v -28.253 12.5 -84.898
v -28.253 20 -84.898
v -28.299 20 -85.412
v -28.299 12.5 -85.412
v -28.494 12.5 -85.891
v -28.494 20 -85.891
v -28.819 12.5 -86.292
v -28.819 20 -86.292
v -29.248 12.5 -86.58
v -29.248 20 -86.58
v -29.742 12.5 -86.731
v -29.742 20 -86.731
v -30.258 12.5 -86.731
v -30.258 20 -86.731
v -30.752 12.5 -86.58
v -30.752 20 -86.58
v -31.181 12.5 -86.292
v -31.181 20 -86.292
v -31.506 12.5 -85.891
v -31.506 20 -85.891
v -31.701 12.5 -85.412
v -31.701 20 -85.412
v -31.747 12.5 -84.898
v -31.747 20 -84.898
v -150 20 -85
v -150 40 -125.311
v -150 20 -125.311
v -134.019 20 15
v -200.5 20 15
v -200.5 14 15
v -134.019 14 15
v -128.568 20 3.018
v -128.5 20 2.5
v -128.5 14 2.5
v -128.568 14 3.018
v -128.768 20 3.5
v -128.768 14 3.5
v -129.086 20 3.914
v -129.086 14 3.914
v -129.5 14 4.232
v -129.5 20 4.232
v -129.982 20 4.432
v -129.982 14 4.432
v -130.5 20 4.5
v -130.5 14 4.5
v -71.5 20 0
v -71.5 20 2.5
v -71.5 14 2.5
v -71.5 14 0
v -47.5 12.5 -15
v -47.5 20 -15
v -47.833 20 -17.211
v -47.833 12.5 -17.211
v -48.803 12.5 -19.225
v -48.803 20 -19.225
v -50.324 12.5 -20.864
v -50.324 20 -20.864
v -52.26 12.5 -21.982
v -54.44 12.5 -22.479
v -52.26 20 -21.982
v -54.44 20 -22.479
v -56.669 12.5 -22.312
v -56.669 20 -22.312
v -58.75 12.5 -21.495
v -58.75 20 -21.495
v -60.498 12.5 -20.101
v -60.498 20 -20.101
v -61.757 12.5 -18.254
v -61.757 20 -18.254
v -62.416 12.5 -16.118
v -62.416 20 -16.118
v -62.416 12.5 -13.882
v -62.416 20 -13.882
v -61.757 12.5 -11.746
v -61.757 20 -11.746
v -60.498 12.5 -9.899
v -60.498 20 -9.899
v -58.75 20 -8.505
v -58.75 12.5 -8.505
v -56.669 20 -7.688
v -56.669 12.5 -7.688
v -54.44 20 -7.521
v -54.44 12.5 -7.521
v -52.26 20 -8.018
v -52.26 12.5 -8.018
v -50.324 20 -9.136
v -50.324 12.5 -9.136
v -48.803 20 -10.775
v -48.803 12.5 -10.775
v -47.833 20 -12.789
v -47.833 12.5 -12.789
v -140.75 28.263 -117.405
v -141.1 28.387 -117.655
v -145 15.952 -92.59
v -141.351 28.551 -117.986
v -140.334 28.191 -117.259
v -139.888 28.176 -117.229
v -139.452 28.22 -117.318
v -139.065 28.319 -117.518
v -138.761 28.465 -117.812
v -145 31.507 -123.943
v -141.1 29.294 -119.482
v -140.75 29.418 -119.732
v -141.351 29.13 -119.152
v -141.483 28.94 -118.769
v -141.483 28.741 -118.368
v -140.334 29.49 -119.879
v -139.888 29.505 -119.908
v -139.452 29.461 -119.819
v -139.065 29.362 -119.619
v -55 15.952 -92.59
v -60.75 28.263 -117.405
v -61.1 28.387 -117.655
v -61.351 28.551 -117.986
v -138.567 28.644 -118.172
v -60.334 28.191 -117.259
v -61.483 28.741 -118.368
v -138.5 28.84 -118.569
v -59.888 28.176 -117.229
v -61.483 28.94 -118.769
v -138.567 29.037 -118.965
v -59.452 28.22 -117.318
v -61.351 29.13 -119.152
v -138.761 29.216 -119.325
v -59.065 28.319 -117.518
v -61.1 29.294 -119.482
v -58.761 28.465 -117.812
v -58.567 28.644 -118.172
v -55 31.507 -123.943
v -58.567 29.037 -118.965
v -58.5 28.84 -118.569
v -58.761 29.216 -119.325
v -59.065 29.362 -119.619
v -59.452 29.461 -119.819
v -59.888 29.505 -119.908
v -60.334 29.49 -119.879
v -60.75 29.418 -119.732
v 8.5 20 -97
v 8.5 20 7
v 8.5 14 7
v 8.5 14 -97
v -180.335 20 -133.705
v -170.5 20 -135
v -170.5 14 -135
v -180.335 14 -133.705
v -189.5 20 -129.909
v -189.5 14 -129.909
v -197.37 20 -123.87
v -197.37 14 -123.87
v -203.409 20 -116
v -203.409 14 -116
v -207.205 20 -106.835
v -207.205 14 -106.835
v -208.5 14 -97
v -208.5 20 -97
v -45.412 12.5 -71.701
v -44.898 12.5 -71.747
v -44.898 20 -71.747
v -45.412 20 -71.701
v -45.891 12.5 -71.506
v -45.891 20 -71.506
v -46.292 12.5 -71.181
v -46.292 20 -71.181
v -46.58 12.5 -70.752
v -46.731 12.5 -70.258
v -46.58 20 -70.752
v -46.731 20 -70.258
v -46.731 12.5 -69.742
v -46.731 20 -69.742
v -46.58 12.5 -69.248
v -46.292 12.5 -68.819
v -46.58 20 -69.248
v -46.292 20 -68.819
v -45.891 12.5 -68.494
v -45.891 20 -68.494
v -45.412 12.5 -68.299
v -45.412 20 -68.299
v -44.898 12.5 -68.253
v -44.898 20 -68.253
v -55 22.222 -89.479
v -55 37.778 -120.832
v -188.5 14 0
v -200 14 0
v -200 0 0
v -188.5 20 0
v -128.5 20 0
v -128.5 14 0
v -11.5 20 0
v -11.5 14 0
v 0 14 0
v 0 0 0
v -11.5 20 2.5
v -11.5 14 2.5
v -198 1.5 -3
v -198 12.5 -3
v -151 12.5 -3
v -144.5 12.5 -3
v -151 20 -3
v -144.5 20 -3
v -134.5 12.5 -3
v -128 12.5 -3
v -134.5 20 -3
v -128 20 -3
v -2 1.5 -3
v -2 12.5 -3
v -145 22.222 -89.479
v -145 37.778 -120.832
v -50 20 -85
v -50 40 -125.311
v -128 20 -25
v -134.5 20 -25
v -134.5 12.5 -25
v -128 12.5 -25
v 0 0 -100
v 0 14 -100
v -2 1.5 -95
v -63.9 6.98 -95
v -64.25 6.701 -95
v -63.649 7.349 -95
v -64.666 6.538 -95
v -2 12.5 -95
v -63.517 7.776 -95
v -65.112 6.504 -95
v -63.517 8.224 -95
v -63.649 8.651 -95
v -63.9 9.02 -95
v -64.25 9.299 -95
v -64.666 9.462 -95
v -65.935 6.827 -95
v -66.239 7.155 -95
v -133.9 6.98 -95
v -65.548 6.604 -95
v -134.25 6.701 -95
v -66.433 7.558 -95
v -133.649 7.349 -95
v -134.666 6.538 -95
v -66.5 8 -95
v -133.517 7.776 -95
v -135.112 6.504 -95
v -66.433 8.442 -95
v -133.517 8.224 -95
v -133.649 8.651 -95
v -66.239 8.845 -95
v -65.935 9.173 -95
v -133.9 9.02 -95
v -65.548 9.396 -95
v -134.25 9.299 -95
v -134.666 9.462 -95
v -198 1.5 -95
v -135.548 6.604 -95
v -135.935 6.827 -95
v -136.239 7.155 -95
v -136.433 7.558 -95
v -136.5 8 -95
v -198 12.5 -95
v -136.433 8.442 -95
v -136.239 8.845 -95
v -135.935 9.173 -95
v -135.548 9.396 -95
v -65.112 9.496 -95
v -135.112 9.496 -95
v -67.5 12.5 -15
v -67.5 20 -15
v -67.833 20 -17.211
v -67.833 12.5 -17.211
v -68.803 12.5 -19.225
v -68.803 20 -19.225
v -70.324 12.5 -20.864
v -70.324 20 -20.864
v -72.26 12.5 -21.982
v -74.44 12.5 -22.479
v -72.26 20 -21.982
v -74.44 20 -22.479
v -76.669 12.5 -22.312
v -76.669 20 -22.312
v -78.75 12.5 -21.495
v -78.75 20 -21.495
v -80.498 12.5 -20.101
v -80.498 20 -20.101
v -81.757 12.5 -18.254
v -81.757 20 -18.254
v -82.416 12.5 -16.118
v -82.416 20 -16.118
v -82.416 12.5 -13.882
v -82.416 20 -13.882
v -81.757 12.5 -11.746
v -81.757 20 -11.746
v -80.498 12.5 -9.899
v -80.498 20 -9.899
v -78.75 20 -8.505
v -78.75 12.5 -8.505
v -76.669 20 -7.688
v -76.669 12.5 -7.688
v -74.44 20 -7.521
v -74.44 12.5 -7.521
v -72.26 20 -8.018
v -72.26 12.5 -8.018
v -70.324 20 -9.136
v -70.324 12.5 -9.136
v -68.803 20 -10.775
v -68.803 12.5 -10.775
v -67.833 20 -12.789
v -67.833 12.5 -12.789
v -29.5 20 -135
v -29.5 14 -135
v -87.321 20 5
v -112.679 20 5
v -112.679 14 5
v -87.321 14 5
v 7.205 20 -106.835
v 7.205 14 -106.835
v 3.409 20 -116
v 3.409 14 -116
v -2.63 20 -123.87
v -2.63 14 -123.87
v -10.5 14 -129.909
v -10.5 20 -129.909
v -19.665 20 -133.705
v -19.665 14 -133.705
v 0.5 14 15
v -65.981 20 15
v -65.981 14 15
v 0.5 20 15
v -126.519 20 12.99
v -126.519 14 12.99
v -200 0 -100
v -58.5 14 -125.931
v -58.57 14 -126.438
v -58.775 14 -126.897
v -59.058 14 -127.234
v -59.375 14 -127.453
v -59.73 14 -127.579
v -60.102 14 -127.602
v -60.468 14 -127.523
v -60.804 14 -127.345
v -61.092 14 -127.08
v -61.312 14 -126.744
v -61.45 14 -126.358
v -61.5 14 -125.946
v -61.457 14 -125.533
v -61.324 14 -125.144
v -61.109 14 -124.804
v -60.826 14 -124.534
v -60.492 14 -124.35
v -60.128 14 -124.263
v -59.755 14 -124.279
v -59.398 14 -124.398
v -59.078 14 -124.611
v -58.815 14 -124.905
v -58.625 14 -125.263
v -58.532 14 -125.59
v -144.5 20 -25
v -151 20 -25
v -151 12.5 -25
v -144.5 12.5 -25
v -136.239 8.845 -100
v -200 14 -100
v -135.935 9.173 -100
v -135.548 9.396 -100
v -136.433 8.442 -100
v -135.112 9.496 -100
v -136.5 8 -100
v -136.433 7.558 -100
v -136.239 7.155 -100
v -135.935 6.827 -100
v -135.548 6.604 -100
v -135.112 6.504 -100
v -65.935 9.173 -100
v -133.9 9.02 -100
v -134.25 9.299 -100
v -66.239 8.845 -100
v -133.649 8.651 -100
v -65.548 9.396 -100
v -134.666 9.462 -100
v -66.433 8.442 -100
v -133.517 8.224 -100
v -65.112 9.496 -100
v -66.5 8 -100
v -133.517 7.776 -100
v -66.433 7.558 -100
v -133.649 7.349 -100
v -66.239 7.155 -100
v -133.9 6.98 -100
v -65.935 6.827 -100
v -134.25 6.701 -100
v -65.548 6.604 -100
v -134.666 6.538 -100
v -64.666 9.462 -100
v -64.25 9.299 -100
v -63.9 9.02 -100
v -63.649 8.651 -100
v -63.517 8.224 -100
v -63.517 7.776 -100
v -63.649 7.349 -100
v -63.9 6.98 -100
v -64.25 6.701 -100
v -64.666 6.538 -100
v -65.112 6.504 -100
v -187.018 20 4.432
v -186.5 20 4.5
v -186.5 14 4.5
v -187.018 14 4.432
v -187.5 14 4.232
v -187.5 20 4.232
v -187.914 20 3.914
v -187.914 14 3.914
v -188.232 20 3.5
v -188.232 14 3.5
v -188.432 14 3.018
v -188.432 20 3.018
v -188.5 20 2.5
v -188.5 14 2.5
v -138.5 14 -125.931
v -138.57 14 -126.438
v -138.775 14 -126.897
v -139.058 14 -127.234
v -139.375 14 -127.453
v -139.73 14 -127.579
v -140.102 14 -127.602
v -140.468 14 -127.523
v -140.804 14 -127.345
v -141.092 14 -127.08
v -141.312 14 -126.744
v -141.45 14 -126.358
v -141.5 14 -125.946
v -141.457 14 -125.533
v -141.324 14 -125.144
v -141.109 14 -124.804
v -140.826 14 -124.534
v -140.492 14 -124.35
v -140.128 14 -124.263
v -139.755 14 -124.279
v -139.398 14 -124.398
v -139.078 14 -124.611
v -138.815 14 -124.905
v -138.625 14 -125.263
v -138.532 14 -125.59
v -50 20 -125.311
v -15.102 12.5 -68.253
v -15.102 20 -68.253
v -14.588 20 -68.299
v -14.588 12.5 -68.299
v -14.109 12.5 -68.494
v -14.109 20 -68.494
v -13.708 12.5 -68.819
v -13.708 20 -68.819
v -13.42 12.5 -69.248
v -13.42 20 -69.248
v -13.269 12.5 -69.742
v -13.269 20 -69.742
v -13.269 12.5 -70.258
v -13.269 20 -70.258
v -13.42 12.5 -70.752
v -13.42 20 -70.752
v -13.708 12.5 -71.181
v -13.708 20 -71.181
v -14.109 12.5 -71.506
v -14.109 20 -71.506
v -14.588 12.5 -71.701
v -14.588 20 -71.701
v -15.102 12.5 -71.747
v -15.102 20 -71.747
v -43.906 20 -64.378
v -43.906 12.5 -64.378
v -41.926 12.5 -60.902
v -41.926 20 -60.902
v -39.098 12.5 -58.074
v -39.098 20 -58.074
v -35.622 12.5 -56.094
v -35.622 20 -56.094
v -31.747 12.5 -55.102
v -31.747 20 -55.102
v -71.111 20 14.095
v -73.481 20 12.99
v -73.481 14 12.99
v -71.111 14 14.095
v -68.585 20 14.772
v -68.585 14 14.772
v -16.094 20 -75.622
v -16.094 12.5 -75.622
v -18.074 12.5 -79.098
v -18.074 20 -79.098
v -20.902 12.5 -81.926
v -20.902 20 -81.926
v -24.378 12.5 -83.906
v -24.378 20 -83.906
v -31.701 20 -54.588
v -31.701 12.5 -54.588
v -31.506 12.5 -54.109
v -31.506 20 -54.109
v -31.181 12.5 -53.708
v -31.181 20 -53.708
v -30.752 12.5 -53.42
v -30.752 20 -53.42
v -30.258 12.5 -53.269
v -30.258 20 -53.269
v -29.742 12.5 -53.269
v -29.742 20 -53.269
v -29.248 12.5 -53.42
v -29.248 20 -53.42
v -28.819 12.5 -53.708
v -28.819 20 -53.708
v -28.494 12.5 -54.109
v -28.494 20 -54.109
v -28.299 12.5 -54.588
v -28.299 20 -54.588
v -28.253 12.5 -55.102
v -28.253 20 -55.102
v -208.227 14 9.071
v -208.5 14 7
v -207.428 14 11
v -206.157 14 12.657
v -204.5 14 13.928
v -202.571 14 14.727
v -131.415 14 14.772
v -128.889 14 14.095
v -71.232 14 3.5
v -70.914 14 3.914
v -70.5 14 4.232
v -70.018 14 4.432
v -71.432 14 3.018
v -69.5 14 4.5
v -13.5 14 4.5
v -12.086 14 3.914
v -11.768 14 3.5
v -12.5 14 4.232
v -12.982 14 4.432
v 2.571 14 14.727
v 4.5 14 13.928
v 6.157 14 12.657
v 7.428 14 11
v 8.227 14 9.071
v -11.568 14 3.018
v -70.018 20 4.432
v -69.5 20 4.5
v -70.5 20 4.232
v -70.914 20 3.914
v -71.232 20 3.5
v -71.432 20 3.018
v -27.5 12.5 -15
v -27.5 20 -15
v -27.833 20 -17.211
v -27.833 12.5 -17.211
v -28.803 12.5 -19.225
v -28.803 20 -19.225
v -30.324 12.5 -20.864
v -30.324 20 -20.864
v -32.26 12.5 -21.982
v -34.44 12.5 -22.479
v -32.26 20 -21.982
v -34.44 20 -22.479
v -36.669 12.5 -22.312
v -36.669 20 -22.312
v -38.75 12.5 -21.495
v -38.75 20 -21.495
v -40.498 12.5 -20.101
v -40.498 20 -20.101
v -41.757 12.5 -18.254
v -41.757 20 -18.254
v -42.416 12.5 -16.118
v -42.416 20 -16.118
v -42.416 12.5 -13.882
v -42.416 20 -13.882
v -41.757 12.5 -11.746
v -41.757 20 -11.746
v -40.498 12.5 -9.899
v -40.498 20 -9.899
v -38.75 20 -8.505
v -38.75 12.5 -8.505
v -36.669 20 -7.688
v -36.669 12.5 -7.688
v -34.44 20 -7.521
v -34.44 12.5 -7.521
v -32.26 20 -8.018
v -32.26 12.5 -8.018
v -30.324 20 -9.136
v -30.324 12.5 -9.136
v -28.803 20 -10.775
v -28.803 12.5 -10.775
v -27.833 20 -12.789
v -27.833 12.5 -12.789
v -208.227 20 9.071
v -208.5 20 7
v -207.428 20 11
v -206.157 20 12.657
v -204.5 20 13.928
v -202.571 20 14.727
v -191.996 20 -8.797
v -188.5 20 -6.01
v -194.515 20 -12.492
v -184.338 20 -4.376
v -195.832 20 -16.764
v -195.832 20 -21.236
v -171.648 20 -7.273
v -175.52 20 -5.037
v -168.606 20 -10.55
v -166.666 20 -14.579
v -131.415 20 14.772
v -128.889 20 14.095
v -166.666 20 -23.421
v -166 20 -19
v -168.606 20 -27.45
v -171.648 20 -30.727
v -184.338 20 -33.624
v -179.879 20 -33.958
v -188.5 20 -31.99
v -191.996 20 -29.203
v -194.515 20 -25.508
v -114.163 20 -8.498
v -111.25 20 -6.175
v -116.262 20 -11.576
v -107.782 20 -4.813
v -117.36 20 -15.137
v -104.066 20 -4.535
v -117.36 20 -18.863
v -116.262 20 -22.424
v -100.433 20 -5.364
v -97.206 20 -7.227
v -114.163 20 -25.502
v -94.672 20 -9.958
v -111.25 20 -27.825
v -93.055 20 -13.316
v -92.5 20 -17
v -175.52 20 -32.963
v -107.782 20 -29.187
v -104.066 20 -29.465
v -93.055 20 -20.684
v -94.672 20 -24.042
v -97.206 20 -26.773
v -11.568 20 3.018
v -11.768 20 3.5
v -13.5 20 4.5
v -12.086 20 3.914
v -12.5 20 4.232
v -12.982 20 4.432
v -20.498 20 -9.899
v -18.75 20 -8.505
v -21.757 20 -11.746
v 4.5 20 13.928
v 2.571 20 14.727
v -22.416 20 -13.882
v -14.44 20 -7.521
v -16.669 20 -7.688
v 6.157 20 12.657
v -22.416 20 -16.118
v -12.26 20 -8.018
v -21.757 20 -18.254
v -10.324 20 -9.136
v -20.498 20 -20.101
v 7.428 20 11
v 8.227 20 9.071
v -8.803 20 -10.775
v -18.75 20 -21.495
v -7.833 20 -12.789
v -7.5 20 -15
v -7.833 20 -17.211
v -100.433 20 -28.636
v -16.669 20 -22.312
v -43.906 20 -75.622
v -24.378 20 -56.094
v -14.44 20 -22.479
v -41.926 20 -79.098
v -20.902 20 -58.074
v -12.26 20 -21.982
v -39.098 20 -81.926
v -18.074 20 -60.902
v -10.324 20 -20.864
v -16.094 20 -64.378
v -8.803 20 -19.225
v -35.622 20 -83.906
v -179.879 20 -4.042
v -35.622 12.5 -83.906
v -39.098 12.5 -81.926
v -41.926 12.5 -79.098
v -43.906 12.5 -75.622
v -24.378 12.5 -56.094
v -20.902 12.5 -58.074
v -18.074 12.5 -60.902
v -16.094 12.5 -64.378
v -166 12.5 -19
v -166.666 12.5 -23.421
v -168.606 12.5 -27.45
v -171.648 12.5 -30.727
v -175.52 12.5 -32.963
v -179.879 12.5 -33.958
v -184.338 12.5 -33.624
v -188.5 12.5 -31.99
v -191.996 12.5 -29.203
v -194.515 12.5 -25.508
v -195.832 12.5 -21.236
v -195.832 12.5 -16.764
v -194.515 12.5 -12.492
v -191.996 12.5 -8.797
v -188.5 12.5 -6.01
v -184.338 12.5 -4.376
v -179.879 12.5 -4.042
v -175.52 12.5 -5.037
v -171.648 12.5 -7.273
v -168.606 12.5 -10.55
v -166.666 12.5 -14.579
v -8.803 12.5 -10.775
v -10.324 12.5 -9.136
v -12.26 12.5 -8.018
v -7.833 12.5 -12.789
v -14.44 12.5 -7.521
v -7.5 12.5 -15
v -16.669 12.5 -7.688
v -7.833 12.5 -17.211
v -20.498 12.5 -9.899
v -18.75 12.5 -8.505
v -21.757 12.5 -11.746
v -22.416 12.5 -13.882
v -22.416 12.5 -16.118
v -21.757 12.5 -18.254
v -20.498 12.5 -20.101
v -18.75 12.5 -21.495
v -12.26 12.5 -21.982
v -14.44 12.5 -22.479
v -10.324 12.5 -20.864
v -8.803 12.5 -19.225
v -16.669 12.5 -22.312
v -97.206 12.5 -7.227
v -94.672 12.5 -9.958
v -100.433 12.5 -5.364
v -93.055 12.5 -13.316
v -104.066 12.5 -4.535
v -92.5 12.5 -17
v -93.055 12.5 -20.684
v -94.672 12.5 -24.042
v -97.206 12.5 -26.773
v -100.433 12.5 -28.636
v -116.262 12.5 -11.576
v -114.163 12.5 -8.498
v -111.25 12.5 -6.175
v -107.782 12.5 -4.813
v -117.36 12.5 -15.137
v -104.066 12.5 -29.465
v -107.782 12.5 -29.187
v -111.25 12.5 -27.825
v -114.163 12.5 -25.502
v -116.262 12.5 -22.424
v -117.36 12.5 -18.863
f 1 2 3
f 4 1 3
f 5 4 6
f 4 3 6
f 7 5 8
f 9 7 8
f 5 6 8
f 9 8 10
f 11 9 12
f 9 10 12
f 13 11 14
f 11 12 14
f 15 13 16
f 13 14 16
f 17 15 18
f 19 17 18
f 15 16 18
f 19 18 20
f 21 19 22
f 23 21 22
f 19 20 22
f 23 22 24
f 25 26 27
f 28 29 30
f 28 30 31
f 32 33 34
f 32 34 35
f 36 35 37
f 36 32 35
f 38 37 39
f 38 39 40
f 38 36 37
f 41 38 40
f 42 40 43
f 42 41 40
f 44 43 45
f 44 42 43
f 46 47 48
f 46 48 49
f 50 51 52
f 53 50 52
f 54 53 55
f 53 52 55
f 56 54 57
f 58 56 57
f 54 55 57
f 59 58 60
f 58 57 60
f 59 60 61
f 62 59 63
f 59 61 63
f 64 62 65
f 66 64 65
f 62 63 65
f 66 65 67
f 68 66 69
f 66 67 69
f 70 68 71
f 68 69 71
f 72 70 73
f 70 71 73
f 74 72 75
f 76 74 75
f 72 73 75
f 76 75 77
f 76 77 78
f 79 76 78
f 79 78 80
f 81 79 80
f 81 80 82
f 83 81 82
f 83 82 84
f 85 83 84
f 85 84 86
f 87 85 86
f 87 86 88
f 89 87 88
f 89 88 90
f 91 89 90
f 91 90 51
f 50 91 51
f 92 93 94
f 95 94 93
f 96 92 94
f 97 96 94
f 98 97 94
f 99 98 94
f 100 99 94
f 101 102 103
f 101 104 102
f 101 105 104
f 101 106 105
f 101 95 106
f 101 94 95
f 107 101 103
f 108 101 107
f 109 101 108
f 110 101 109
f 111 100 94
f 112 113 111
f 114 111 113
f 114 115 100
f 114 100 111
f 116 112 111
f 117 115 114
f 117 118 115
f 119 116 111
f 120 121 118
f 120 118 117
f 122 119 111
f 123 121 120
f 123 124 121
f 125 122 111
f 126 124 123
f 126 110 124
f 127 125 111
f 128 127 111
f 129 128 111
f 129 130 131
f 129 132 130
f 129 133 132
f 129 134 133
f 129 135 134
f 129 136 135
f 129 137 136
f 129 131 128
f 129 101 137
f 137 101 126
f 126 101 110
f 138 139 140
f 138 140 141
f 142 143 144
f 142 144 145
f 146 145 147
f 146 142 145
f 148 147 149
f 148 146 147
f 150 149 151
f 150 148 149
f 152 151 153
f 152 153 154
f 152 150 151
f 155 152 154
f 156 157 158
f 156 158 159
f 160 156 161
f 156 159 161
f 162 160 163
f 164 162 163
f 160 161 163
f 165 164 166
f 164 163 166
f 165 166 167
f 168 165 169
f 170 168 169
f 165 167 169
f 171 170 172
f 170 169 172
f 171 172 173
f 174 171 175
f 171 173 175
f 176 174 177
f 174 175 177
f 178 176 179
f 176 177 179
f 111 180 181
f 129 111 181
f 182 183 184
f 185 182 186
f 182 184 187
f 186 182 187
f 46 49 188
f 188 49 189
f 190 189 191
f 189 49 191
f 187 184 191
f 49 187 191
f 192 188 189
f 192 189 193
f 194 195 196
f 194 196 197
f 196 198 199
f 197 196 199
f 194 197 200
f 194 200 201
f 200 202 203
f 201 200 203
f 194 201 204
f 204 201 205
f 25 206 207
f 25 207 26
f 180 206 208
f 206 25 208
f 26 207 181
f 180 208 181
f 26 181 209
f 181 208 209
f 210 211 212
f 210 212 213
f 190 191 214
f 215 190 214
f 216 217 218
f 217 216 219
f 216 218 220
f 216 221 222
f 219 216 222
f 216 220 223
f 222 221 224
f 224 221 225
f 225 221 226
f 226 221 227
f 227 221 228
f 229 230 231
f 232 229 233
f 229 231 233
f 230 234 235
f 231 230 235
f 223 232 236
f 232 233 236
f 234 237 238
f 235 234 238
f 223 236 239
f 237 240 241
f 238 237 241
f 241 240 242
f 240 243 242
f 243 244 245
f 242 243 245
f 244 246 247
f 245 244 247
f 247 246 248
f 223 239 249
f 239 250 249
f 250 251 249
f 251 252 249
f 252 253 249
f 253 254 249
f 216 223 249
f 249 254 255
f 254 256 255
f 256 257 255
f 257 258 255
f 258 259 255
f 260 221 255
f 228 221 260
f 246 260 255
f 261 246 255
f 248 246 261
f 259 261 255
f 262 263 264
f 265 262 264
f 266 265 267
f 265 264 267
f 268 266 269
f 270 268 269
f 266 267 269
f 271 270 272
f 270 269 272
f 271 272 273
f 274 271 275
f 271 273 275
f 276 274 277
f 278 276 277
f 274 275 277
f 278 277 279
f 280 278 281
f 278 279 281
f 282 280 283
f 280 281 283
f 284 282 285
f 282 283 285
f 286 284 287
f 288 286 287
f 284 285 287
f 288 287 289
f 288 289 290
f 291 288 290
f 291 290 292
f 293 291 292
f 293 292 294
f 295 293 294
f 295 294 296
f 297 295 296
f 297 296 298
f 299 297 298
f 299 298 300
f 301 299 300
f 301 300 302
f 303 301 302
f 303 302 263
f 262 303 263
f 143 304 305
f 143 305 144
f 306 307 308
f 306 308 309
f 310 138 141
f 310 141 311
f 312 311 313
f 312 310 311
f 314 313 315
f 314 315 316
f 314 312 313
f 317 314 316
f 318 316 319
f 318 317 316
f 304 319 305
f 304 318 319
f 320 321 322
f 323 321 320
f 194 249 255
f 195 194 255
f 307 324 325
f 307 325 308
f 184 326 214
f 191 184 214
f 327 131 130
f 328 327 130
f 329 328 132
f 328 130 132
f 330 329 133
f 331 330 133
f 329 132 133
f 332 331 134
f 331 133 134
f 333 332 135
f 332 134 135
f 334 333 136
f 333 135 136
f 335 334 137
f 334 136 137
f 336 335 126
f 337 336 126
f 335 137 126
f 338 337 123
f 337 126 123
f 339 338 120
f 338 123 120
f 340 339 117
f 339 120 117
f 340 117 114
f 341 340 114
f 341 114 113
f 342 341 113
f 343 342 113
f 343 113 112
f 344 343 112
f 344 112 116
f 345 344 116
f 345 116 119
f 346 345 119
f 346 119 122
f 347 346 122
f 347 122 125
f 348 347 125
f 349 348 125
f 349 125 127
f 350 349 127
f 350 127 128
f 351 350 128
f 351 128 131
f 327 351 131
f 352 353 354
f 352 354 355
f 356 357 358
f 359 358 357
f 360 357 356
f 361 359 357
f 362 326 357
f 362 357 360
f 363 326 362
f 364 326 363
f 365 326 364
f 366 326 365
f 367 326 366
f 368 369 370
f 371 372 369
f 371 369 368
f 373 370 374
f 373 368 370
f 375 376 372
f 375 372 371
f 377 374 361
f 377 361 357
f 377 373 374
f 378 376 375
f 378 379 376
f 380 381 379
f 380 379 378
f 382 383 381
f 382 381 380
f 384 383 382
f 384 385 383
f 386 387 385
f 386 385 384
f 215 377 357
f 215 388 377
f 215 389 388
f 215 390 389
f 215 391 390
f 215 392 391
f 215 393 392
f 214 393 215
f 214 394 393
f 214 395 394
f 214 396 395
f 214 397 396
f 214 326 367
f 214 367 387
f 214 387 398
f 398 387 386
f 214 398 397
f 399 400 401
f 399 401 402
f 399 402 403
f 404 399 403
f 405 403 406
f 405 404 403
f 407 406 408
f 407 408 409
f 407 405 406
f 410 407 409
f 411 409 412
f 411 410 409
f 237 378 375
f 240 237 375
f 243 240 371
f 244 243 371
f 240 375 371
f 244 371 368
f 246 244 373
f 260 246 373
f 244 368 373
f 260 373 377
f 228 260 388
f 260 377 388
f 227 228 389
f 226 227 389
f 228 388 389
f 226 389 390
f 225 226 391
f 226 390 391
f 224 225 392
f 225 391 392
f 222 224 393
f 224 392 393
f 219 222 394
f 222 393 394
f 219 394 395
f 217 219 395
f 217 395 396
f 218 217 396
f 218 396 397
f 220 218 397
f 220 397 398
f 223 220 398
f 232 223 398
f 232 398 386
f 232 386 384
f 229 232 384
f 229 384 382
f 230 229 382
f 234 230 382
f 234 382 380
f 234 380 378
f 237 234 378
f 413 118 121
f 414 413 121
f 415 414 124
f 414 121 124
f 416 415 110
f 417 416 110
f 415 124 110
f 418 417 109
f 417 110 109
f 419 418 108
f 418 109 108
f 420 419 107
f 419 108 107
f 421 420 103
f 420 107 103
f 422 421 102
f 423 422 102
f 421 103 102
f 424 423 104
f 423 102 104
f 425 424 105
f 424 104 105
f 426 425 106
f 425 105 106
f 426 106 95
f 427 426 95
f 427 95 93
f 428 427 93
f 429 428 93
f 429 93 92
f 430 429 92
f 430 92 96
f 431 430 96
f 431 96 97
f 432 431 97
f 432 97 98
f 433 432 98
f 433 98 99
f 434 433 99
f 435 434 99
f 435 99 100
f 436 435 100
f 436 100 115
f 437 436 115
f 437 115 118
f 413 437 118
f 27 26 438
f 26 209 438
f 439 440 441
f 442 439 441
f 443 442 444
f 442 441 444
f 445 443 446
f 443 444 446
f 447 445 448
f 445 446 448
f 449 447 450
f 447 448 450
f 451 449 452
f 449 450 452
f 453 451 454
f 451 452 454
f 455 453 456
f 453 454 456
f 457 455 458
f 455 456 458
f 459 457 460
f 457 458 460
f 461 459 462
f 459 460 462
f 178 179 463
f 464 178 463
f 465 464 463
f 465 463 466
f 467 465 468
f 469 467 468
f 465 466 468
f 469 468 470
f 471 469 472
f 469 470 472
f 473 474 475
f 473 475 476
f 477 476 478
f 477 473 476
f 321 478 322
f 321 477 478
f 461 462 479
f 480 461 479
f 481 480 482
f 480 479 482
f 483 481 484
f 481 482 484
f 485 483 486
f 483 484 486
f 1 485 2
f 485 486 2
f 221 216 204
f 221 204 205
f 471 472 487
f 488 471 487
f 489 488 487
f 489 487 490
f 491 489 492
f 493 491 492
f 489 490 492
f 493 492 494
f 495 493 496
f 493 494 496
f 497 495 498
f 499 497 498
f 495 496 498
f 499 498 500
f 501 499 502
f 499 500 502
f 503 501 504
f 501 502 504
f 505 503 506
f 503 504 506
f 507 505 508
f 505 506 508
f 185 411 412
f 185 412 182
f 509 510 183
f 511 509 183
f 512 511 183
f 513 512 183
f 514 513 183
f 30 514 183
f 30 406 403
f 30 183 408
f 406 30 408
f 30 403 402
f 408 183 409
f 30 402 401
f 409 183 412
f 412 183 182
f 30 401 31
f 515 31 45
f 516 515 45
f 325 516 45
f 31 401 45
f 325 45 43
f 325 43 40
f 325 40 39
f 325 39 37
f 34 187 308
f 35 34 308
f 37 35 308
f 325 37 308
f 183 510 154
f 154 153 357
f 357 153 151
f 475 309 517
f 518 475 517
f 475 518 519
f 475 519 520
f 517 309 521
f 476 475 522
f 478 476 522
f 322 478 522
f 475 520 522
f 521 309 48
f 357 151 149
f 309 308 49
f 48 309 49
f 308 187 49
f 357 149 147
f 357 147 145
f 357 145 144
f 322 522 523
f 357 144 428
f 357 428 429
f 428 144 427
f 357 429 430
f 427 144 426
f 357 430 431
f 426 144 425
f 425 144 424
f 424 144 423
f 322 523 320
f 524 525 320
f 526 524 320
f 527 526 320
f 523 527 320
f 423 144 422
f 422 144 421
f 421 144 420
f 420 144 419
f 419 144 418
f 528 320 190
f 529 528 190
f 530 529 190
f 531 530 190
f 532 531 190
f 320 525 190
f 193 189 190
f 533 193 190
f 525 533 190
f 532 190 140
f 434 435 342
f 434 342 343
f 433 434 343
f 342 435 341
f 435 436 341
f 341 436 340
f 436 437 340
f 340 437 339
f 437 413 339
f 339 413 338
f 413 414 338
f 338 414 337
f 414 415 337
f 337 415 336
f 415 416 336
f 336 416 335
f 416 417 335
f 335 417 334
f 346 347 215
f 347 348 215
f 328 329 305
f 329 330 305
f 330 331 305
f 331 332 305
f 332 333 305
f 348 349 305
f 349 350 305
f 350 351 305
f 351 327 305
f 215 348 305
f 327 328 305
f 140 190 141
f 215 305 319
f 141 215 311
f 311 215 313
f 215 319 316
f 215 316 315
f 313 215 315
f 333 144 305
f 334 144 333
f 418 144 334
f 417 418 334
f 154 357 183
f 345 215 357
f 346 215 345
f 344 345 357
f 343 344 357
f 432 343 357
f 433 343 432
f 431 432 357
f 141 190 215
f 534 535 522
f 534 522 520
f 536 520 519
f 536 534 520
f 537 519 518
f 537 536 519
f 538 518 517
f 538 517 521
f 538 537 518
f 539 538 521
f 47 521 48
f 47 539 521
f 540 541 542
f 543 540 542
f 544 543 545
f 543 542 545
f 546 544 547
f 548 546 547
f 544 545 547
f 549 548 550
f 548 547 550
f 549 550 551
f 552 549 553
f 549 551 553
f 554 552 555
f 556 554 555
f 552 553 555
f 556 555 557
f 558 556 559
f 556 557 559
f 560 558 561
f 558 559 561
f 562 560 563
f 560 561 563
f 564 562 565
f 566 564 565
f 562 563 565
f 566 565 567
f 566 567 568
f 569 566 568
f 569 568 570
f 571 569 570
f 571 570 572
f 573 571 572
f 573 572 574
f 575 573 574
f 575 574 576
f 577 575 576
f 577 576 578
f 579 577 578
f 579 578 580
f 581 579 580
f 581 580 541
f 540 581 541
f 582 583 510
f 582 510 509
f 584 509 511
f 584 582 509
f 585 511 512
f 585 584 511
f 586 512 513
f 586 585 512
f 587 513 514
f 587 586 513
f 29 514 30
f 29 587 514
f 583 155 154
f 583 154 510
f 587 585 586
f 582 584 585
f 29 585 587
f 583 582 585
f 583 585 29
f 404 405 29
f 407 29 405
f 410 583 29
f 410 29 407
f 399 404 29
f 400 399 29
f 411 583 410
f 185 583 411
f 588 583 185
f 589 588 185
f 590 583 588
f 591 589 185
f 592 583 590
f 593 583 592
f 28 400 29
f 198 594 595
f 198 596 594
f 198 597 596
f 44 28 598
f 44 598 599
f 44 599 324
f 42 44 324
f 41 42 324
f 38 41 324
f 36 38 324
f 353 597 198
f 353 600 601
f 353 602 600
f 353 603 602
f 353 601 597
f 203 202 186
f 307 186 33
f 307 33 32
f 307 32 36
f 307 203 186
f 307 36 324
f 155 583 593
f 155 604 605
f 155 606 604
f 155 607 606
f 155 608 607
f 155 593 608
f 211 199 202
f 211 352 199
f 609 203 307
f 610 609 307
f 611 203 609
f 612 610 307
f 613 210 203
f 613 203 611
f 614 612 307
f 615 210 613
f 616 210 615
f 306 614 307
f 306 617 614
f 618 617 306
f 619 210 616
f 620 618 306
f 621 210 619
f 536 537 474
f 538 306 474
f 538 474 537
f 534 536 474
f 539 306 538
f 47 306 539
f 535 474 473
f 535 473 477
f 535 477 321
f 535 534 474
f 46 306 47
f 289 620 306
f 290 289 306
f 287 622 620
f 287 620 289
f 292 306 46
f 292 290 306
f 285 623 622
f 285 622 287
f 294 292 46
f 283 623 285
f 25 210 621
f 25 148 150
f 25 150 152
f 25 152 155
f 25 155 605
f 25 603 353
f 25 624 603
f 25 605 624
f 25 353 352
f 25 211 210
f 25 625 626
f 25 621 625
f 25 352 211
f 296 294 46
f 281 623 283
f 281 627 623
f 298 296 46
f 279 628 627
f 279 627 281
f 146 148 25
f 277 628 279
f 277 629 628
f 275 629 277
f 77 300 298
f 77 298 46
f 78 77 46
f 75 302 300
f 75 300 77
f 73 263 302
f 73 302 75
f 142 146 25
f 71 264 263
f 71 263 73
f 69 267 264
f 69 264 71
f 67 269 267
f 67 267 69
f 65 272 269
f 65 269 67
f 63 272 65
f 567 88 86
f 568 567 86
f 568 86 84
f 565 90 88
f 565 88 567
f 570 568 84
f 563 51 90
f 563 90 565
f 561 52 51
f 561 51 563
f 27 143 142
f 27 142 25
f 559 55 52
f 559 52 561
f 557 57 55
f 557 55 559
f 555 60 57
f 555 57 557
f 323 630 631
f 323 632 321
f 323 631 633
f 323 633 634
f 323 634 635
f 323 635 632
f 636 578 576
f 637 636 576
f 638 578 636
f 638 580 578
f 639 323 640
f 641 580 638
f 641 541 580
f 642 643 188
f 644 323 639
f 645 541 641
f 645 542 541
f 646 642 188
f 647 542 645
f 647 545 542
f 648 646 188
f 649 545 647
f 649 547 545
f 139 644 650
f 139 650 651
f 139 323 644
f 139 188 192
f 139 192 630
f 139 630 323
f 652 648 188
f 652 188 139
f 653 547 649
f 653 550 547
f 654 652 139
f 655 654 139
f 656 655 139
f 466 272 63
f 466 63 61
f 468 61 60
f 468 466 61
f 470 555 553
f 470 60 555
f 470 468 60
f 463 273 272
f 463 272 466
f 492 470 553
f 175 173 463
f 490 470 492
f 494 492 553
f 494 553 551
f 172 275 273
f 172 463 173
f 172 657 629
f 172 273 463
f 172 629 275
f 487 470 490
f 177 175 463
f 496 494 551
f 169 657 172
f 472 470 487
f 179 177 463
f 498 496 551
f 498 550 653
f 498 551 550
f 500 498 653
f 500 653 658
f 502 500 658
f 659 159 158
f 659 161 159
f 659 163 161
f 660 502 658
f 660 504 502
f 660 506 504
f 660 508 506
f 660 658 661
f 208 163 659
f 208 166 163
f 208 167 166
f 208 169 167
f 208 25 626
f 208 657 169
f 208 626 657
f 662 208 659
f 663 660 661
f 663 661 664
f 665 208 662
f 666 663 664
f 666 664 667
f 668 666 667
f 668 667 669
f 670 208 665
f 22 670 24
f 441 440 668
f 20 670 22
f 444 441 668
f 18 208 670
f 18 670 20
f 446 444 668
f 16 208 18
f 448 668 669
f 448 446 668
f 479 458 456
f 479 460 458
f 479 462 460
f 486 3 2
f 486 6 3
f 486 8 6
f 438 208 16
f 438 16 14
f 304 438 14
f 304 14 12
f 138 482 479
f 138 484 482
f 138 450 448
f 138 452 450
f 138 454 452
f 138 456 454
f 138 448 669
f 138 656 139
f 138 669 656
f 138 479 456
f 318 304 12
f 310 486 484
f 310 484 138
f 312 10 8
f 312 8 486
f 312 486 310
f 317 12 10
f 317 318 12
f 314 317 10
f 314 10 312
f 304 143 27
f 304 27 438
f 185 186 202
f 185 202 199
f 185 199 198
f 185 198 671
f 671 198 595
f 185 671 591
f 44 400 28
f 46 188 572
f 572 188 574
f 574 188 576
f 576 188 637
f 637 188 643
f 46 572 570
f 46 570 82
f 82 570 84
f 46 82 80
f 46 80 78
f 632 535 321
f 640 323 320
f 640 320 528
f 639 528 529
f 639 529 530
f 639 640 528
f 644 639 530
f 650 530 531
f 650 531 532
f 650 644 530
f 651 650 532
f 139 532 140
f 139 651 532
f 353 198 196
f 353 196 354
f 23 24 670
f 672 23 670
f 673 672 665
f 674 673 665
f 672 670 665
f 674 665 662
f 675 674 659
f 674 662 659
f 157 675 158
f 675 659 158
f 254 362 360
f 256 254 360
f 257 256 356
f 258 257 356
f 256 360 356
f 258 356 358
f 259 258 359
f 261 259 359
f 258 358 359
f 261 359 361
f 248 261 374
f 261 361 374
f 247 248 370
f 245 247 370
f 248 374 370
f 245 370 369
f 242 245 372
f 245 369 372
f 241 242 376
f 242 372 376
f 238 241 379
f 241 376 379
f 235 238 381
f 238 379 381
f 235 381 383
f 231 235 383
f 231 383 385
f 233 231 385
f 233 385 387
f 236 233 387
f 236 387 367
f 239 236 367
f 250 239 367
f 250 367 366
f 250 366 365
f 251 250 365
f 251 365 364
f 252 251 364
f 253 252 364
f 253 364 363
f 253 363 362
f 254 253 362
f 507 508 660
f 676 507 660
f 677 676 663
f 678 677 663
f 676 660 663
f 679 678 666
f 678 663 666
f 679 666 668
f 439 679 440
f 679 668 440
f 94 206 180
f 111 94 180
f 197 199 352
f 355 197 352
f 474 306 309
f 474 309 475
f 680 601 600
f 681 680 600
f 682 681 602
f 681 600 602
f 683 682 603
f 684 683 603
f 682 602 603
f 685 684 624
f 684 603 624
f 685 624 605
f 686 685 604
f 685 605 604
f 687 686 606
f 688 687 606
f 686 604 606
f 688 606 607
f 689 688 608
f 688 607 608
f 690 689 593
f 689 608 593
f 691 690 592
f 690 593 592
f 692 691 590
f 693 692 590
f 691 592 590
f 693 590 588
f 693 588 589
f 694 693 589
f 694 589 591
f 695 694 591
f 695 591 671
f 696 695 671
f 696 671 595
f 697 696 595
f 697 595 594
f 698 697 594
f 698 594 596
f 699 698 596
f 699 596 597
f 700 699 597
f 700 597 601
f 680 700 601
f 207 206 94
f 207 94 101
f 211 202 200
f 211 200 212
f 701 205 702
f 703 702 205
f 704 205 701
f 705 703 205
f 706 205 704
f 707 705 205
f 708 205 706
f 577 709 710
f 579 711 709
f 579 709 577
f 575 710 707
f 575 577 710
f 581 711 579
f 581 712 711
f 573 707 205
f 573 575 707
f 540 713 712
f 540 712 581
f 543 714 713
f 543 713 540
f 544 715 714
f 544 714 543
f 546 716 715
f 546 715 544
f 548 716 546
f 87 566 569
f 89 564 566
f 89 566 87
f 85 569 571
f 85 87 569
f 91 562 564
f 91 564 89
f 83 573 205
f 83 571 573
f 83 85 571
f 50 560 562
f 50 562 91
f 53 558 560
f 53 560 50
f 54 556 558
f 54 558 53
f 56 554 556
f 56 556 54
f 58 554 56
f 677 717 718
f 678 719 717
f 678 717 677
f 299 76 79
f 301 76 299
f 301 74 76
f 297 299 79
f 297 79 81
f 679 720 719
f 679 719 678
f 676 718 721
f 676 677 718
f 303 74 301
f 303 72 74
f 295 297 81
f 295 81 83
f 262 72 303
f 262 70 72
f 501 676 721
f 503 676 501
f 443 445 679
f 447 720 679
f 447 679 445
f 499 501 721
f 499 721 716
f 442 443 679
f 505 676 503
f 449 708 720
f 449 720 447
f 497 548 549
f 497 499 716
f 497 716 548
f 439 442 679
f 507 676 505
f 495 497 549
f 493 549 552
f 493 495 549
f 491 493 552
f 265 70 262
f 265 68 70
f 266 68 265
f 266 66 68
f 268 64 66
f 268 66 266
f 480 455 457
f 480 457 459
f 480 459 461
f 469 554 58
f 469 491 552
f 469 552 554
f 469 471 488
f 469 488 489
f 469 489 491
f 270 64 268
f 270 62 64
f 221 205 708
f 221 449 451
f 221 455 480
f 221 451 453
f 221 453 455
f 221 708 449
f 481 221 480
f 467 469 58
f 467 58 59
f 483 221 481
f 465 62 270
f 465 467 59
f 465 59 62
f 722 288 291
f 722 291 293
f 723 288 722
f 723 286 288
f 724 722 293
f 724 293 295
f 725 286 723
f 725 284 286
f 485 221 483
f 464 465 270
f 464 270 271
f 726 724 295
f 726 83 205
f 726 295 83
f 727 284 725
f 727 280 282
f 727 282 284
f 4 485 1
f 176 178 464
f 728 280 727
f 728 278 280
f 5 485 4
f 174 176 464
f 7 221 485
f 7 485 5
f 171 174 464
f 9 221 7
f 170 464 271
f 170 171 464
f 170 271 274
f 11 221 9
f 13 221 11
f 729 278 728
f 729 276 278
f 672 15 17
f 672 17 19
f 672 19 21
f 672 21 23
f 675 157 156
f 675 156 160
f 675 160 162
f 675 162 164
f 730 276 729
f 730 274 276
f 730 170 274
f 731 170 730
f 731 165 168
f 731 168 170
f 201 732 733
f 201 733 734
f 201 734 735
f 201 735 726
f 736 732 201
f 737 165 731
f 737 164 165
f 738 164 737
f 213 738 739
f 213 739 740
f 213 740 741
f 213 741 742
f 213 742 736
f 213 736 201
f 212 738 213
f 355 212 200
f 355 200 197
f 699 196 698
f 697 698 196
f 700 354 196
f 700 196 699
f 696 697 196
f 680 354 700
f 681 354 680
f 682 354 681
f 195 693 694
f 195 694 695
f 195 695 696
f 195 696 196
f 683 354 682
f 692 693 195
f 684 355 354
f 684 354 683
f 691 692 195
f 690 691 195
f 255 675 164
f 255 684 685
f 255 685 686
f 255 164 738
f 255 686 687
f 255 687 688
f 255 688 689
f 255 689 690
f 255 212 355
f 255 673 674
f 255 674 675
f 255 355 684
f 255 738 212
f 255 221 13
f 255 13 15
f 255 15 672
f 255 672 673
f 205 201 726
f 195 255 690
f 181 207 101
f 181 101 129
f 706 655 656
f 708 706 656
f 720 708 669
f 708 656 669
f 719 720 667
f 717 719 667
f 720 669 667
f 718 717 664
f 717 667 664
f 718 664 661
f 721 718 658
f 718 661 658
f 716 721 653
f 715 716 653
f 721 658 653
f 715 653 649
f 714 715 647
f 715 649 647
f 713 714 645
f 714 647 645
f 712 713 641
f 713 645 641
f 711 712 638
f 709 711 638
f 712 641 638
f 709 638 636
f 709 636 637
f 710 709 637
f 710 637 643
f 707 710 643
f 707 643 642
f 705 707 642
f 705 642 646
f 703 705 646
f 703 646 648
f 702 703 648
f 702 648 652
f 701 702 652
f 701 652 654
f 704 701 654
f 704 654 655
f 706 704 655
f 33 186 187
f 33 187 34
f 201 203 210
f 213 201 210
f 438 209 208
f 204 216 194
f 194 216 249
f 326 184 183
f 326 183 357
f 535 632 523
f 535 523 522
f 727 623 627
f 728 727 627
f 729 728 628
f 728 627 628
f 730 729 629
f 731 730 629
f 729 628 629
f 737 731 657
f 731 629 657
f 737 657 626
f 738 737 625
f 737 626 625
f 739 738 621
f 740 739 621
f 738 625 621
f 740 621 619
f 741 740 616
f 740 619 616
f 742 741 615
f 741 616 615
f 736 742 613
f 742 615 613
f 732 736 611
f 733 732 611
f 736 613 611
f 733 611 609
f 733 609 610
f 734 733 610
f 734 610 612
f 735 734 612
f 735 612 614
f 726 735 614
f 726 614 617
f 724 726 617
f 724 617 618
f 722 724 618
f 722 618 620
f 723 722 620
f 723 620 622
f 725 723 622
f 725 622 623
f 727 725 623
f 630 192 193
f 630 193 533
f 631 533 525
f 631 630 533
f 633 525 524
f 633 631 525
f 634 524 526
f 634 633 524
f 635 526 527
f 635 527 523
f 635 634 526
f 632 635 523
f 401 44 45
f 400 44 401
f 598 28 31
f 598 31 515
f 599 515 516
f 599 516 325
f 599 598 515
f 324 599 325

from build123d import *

# Parameters (mm, degrees)
IZIM2_W                     = 200
IZIM2_H                     = 100
Y_KSEKLIK_EKSTR_ZYON1_DEPTH = 20
IZIM3_R                     = 7.5
IZIM3_R_2                   = 12.5
IZIM3_R_3                   = 15
IZIM3_W                     = 6.5
IZIM3_H                     = 22
KES_EKSTR_ZYON11_DEPTH      = 12
Y_KSEKLIK_EKSTR_ZYON2_DEPTH = 6
Y_KSEKLIK_EKSTR_ZYON3_DEPTH = 50
IZIM9_W                     = 90
IZIM9_H                     = 35
KES_EKSTR_ZYON12_DEPTH      = 7
IZIM12_R                    = 1.5
KES_EKSTR_ZYON14_DEPTH      = 34.138350552
IZIM15_W                    = 196
IZIM15_H                    = 11
KES_EKSTR_ZYON15_DEPTH      = 92
IZIM16_R                    = 1.5
KES_EKSTR_ZYON16_DEPTH      = 10


with BuildPart() as part:
    # Çizim2 → Yükseklik-Ekstrüzyon1 (new body)
    with BuildSketch(Plane(origin=(0, 0, 0), x_dir=(1, 0, 0), z_dir=(0, 1, 0))):
        with Locations((-100, 50)):
            Rectangle(IZIM2_W, IZIM2_H)
    extrude(amount=Y_KSEKLIK_EKSTR_ZYON1_DEPTH)

    # Çizim3 → Kes-Ekstrüzyon11 (cut)
    with BuildSketch(Plane(origin=(0, 20, 0), x_dir=(1, 0, 0), z_dir=(0, 1, 0))):
        with Locations((-15, 15)):
            Circle(IZIM3_R)
        with Locations((-35, 15)):
            Circle(IZIM3_R)
        with Locations((-55, 15)):
            Circle(IZIM3_R)
        with Locations((-75, 15)):
            Circle(IZIM3_R)
        with Locations((-105, 17)):
            Circle(IZIM3_R_2)
        with Locations((-181, 19)):
            Circle(IZIM3_R_3)
        with Locations((-147.75, 14)):
            Rectangle(IZIM3_W, IZIM3_H)
        with Locations((-131.25, 14)):
            Rectangle(IZIM3_W, IZIM3_H)
        with BuildLine():
            ThreePointArc((-44.897916667, 68.252979968), (-40.606601718, 59.393398282), (-31.747020032, 55.102083333))
            ThreePointArc((-31.747020032, 55.102083333), (-30, 53.25), (-28.252979968, 55.102083333))
            ThreePointArc((-28.252979968, 55.102083333), (-19.393398282, 59.393398282), (-15.102083333, 68.252979968))
            ThreePointArc((-15.102083333, 68.252979968), (-13.25, 70), (-15.102083333, 71.747020032))
            ThreePointArc((-15.102083333, 71.747020032), (-19.393398282, 80.606601718), (-28.252979968, 84.897916667))
            ThreePointArc((-28.252979968, 84.897916667), (-30, 86.75), (-31.747020032, 84.897916667))
            ThreePointArc((-31.747020032, 84.897916667), (-40.606601718, 80.606601718), (-44.897916667, 71.747020032))
            ThreePointArc((-44.897916667, 71.747020032), (-46.75, 70), (-44.897916667, 68.252979968))
        make_face()
    extrude(amount=-KES_EKSTR_ZYON11_DEPTH, mode=Mode.SUBTRACT)

    # Çizim7 → Yükseklik-Ekstrüzyon2 (add)
    with BuildSketch(Plane(origin=(0, 20, 0), x_dir=(1, 0, 0), z_dir=(0, 1, 0))):
        with BuildLine():
            Line((-112.679491924, -5), (-87.320508076, -5))
            Line((-87.320508076, -5), (-73.480762114, -12.990381057))
            ThreePointArc((-73.480762114, -12.990381057), (-69.86304779, -14.488887394), (-65.980762114, -15))
            Line((-65.980762114, -15), (0.5, -15))
            ThreePointArc((0.5, -15), (6.156854249, -12.656854249), (8.5, -7))
            Line((8.5, -7), (8.5, 97))
            ThreePointArc((8.5, 97), (-2.629942315, 123.870057685), (-29.5, 135))
            Line((-29.5, 135), (-170.5, 135))
            ThreePointArc((-170.5, 135), (-197.370057685, 123.870057685), (-208.5, 97))
            Line((-208.5, 97), (-208.5, -7))
            ThreePointArc((-208.5, -7), (-206.156854249, -12.656854249), (-200.5, -15))
            Line((-200.5, -15), (-134.019237886, -15))
            ThreePointArc((-134.019237886, -15), (-130.13695221, -14.488887394), (-126.519237886, -12.990381057))
            Line((-126.519237886, -12.990381057), (-112.679491924, -5))
        make_face()
        with BuildLine():
            Line((-71.5, 0), (-128.5, 0))
            Line((-128.5, 0), (-128.5, -2.5))
            ThreePointArc((-128.5, -2.5), (-129.085786438, -3.914213562), (-130.5, -4.5))
            Line((-130.5, -4.5), (-186.5, -4.5))
            ThreePointArc((-186.5, -4.5), (-187.914213562, -3.914213562), (-188.5, -2.5))
            Line((-188.5, -2.5), (-188.5, 0))
            Line((-188.5, 0), (-200, 0))
            Line((-200, 0), (-200, 100))
            Line((-200, 100), (0, 100))
            Line((0, 100), (0, 0))
            Line((0, 0), (-11.5, 0))
            Line((-11.5, 0), (-11.5, -2.5))
            ThreePointArc((-11.5, -2.5), (-12.085786438, -3.914213562), (-13.5, -4.5))
            Line((-13.5, -4.5), (-69.5, -4.5))
            ThreePointArc((-69.5, -4.5), (-70.914213562, -3.914213562), (-71.5, -2.5))
            Line((-71.5, -2.5), (-71.5, 0))
        make_face(mode=Mode.SUBTRACT)
    extrude(amount=-Y_KSEKLIK_EKSTR_ZYON2_DEPTH)

    # Çizim8 → Yükseklik-Ekstrüzyon3 (add, symmetric)
    with BuildSketch(Plane(origin=(-100, 0, 0), x_dir=(0, 0, -1), z_dir=(1, 0, 0))):
        Polygon((85, 20), (125.311288741, 40), (125.311288741, 20), align=None)
    extrude(amount=Y_KSEKLIK_EKSTR_ZYON3_DEPTH, both=True)

    # Çizim9 → Kes-Ekstrüzyon12 (cut)
    with BuildSketch(Plane(origin=(0, -17.792193018, -8.827399755), x_dir=(1, 0, 0), z_dir=(0, 0.895806416, 0.444444444))):
        with Locations((-100, 107.532434289)):
            Rectangle(IZIM9_W, IZIM9_H)
    extrude(amount=-KES_EKSTR_ZYON12_DEPTH, mode=Mode.SUBTRACT)

    # Çizim12 → Kes-Ekstrüzyon14 (cut, through all)
    with BuildSketch(Plane(origin=(0, -24.062837933, -11.938510866), x_dir=(1, 0, 0), z_dir=(0, 0.895806416, 0.444444444))):
        with Locations((-140, 119.032434289)):
            Circle(IZIM12_R)
        with Locations((-60, 119.032434289)):
            Circle(IZIM12_R)
    extrude(amount=-KES_EKSTR_ZYON14_DEPTH, mode=Mode.SUBTRACT)

    # Çizim15 → Kes-Ekstrüzyon15 (cut)
    with BuildSketch(Plane(origin=(0, 0, -95), x_dir=(-1, 0, 0), z_dir=(0, 0, -1))):
        with Locations((100, 7)):
            Rectangle(IZIM15_W, IZIM15_H)
    extrude(amount=-KES_EKSTR_ZYON15_DEPTH, mode=Mode.SUBTRACT)

    # Çizim16 → Kes-Ekstrüzyon16 (cut)
    with BuildSketch(Plane(origin=(0, 0, -100), x_dir=(-1, 0, 0), z_dir=(0, 0, -1))):
        with Locations((65, 8)):
            Circle(IZIM16_R)
        with Locations((135, 8)):
            Circle(IZIM16_R)
    extrude(amount=-KES_EKSTR_ZYON16_DEPTH, mode=Mode.SUBTRACT)


solid = part.part
